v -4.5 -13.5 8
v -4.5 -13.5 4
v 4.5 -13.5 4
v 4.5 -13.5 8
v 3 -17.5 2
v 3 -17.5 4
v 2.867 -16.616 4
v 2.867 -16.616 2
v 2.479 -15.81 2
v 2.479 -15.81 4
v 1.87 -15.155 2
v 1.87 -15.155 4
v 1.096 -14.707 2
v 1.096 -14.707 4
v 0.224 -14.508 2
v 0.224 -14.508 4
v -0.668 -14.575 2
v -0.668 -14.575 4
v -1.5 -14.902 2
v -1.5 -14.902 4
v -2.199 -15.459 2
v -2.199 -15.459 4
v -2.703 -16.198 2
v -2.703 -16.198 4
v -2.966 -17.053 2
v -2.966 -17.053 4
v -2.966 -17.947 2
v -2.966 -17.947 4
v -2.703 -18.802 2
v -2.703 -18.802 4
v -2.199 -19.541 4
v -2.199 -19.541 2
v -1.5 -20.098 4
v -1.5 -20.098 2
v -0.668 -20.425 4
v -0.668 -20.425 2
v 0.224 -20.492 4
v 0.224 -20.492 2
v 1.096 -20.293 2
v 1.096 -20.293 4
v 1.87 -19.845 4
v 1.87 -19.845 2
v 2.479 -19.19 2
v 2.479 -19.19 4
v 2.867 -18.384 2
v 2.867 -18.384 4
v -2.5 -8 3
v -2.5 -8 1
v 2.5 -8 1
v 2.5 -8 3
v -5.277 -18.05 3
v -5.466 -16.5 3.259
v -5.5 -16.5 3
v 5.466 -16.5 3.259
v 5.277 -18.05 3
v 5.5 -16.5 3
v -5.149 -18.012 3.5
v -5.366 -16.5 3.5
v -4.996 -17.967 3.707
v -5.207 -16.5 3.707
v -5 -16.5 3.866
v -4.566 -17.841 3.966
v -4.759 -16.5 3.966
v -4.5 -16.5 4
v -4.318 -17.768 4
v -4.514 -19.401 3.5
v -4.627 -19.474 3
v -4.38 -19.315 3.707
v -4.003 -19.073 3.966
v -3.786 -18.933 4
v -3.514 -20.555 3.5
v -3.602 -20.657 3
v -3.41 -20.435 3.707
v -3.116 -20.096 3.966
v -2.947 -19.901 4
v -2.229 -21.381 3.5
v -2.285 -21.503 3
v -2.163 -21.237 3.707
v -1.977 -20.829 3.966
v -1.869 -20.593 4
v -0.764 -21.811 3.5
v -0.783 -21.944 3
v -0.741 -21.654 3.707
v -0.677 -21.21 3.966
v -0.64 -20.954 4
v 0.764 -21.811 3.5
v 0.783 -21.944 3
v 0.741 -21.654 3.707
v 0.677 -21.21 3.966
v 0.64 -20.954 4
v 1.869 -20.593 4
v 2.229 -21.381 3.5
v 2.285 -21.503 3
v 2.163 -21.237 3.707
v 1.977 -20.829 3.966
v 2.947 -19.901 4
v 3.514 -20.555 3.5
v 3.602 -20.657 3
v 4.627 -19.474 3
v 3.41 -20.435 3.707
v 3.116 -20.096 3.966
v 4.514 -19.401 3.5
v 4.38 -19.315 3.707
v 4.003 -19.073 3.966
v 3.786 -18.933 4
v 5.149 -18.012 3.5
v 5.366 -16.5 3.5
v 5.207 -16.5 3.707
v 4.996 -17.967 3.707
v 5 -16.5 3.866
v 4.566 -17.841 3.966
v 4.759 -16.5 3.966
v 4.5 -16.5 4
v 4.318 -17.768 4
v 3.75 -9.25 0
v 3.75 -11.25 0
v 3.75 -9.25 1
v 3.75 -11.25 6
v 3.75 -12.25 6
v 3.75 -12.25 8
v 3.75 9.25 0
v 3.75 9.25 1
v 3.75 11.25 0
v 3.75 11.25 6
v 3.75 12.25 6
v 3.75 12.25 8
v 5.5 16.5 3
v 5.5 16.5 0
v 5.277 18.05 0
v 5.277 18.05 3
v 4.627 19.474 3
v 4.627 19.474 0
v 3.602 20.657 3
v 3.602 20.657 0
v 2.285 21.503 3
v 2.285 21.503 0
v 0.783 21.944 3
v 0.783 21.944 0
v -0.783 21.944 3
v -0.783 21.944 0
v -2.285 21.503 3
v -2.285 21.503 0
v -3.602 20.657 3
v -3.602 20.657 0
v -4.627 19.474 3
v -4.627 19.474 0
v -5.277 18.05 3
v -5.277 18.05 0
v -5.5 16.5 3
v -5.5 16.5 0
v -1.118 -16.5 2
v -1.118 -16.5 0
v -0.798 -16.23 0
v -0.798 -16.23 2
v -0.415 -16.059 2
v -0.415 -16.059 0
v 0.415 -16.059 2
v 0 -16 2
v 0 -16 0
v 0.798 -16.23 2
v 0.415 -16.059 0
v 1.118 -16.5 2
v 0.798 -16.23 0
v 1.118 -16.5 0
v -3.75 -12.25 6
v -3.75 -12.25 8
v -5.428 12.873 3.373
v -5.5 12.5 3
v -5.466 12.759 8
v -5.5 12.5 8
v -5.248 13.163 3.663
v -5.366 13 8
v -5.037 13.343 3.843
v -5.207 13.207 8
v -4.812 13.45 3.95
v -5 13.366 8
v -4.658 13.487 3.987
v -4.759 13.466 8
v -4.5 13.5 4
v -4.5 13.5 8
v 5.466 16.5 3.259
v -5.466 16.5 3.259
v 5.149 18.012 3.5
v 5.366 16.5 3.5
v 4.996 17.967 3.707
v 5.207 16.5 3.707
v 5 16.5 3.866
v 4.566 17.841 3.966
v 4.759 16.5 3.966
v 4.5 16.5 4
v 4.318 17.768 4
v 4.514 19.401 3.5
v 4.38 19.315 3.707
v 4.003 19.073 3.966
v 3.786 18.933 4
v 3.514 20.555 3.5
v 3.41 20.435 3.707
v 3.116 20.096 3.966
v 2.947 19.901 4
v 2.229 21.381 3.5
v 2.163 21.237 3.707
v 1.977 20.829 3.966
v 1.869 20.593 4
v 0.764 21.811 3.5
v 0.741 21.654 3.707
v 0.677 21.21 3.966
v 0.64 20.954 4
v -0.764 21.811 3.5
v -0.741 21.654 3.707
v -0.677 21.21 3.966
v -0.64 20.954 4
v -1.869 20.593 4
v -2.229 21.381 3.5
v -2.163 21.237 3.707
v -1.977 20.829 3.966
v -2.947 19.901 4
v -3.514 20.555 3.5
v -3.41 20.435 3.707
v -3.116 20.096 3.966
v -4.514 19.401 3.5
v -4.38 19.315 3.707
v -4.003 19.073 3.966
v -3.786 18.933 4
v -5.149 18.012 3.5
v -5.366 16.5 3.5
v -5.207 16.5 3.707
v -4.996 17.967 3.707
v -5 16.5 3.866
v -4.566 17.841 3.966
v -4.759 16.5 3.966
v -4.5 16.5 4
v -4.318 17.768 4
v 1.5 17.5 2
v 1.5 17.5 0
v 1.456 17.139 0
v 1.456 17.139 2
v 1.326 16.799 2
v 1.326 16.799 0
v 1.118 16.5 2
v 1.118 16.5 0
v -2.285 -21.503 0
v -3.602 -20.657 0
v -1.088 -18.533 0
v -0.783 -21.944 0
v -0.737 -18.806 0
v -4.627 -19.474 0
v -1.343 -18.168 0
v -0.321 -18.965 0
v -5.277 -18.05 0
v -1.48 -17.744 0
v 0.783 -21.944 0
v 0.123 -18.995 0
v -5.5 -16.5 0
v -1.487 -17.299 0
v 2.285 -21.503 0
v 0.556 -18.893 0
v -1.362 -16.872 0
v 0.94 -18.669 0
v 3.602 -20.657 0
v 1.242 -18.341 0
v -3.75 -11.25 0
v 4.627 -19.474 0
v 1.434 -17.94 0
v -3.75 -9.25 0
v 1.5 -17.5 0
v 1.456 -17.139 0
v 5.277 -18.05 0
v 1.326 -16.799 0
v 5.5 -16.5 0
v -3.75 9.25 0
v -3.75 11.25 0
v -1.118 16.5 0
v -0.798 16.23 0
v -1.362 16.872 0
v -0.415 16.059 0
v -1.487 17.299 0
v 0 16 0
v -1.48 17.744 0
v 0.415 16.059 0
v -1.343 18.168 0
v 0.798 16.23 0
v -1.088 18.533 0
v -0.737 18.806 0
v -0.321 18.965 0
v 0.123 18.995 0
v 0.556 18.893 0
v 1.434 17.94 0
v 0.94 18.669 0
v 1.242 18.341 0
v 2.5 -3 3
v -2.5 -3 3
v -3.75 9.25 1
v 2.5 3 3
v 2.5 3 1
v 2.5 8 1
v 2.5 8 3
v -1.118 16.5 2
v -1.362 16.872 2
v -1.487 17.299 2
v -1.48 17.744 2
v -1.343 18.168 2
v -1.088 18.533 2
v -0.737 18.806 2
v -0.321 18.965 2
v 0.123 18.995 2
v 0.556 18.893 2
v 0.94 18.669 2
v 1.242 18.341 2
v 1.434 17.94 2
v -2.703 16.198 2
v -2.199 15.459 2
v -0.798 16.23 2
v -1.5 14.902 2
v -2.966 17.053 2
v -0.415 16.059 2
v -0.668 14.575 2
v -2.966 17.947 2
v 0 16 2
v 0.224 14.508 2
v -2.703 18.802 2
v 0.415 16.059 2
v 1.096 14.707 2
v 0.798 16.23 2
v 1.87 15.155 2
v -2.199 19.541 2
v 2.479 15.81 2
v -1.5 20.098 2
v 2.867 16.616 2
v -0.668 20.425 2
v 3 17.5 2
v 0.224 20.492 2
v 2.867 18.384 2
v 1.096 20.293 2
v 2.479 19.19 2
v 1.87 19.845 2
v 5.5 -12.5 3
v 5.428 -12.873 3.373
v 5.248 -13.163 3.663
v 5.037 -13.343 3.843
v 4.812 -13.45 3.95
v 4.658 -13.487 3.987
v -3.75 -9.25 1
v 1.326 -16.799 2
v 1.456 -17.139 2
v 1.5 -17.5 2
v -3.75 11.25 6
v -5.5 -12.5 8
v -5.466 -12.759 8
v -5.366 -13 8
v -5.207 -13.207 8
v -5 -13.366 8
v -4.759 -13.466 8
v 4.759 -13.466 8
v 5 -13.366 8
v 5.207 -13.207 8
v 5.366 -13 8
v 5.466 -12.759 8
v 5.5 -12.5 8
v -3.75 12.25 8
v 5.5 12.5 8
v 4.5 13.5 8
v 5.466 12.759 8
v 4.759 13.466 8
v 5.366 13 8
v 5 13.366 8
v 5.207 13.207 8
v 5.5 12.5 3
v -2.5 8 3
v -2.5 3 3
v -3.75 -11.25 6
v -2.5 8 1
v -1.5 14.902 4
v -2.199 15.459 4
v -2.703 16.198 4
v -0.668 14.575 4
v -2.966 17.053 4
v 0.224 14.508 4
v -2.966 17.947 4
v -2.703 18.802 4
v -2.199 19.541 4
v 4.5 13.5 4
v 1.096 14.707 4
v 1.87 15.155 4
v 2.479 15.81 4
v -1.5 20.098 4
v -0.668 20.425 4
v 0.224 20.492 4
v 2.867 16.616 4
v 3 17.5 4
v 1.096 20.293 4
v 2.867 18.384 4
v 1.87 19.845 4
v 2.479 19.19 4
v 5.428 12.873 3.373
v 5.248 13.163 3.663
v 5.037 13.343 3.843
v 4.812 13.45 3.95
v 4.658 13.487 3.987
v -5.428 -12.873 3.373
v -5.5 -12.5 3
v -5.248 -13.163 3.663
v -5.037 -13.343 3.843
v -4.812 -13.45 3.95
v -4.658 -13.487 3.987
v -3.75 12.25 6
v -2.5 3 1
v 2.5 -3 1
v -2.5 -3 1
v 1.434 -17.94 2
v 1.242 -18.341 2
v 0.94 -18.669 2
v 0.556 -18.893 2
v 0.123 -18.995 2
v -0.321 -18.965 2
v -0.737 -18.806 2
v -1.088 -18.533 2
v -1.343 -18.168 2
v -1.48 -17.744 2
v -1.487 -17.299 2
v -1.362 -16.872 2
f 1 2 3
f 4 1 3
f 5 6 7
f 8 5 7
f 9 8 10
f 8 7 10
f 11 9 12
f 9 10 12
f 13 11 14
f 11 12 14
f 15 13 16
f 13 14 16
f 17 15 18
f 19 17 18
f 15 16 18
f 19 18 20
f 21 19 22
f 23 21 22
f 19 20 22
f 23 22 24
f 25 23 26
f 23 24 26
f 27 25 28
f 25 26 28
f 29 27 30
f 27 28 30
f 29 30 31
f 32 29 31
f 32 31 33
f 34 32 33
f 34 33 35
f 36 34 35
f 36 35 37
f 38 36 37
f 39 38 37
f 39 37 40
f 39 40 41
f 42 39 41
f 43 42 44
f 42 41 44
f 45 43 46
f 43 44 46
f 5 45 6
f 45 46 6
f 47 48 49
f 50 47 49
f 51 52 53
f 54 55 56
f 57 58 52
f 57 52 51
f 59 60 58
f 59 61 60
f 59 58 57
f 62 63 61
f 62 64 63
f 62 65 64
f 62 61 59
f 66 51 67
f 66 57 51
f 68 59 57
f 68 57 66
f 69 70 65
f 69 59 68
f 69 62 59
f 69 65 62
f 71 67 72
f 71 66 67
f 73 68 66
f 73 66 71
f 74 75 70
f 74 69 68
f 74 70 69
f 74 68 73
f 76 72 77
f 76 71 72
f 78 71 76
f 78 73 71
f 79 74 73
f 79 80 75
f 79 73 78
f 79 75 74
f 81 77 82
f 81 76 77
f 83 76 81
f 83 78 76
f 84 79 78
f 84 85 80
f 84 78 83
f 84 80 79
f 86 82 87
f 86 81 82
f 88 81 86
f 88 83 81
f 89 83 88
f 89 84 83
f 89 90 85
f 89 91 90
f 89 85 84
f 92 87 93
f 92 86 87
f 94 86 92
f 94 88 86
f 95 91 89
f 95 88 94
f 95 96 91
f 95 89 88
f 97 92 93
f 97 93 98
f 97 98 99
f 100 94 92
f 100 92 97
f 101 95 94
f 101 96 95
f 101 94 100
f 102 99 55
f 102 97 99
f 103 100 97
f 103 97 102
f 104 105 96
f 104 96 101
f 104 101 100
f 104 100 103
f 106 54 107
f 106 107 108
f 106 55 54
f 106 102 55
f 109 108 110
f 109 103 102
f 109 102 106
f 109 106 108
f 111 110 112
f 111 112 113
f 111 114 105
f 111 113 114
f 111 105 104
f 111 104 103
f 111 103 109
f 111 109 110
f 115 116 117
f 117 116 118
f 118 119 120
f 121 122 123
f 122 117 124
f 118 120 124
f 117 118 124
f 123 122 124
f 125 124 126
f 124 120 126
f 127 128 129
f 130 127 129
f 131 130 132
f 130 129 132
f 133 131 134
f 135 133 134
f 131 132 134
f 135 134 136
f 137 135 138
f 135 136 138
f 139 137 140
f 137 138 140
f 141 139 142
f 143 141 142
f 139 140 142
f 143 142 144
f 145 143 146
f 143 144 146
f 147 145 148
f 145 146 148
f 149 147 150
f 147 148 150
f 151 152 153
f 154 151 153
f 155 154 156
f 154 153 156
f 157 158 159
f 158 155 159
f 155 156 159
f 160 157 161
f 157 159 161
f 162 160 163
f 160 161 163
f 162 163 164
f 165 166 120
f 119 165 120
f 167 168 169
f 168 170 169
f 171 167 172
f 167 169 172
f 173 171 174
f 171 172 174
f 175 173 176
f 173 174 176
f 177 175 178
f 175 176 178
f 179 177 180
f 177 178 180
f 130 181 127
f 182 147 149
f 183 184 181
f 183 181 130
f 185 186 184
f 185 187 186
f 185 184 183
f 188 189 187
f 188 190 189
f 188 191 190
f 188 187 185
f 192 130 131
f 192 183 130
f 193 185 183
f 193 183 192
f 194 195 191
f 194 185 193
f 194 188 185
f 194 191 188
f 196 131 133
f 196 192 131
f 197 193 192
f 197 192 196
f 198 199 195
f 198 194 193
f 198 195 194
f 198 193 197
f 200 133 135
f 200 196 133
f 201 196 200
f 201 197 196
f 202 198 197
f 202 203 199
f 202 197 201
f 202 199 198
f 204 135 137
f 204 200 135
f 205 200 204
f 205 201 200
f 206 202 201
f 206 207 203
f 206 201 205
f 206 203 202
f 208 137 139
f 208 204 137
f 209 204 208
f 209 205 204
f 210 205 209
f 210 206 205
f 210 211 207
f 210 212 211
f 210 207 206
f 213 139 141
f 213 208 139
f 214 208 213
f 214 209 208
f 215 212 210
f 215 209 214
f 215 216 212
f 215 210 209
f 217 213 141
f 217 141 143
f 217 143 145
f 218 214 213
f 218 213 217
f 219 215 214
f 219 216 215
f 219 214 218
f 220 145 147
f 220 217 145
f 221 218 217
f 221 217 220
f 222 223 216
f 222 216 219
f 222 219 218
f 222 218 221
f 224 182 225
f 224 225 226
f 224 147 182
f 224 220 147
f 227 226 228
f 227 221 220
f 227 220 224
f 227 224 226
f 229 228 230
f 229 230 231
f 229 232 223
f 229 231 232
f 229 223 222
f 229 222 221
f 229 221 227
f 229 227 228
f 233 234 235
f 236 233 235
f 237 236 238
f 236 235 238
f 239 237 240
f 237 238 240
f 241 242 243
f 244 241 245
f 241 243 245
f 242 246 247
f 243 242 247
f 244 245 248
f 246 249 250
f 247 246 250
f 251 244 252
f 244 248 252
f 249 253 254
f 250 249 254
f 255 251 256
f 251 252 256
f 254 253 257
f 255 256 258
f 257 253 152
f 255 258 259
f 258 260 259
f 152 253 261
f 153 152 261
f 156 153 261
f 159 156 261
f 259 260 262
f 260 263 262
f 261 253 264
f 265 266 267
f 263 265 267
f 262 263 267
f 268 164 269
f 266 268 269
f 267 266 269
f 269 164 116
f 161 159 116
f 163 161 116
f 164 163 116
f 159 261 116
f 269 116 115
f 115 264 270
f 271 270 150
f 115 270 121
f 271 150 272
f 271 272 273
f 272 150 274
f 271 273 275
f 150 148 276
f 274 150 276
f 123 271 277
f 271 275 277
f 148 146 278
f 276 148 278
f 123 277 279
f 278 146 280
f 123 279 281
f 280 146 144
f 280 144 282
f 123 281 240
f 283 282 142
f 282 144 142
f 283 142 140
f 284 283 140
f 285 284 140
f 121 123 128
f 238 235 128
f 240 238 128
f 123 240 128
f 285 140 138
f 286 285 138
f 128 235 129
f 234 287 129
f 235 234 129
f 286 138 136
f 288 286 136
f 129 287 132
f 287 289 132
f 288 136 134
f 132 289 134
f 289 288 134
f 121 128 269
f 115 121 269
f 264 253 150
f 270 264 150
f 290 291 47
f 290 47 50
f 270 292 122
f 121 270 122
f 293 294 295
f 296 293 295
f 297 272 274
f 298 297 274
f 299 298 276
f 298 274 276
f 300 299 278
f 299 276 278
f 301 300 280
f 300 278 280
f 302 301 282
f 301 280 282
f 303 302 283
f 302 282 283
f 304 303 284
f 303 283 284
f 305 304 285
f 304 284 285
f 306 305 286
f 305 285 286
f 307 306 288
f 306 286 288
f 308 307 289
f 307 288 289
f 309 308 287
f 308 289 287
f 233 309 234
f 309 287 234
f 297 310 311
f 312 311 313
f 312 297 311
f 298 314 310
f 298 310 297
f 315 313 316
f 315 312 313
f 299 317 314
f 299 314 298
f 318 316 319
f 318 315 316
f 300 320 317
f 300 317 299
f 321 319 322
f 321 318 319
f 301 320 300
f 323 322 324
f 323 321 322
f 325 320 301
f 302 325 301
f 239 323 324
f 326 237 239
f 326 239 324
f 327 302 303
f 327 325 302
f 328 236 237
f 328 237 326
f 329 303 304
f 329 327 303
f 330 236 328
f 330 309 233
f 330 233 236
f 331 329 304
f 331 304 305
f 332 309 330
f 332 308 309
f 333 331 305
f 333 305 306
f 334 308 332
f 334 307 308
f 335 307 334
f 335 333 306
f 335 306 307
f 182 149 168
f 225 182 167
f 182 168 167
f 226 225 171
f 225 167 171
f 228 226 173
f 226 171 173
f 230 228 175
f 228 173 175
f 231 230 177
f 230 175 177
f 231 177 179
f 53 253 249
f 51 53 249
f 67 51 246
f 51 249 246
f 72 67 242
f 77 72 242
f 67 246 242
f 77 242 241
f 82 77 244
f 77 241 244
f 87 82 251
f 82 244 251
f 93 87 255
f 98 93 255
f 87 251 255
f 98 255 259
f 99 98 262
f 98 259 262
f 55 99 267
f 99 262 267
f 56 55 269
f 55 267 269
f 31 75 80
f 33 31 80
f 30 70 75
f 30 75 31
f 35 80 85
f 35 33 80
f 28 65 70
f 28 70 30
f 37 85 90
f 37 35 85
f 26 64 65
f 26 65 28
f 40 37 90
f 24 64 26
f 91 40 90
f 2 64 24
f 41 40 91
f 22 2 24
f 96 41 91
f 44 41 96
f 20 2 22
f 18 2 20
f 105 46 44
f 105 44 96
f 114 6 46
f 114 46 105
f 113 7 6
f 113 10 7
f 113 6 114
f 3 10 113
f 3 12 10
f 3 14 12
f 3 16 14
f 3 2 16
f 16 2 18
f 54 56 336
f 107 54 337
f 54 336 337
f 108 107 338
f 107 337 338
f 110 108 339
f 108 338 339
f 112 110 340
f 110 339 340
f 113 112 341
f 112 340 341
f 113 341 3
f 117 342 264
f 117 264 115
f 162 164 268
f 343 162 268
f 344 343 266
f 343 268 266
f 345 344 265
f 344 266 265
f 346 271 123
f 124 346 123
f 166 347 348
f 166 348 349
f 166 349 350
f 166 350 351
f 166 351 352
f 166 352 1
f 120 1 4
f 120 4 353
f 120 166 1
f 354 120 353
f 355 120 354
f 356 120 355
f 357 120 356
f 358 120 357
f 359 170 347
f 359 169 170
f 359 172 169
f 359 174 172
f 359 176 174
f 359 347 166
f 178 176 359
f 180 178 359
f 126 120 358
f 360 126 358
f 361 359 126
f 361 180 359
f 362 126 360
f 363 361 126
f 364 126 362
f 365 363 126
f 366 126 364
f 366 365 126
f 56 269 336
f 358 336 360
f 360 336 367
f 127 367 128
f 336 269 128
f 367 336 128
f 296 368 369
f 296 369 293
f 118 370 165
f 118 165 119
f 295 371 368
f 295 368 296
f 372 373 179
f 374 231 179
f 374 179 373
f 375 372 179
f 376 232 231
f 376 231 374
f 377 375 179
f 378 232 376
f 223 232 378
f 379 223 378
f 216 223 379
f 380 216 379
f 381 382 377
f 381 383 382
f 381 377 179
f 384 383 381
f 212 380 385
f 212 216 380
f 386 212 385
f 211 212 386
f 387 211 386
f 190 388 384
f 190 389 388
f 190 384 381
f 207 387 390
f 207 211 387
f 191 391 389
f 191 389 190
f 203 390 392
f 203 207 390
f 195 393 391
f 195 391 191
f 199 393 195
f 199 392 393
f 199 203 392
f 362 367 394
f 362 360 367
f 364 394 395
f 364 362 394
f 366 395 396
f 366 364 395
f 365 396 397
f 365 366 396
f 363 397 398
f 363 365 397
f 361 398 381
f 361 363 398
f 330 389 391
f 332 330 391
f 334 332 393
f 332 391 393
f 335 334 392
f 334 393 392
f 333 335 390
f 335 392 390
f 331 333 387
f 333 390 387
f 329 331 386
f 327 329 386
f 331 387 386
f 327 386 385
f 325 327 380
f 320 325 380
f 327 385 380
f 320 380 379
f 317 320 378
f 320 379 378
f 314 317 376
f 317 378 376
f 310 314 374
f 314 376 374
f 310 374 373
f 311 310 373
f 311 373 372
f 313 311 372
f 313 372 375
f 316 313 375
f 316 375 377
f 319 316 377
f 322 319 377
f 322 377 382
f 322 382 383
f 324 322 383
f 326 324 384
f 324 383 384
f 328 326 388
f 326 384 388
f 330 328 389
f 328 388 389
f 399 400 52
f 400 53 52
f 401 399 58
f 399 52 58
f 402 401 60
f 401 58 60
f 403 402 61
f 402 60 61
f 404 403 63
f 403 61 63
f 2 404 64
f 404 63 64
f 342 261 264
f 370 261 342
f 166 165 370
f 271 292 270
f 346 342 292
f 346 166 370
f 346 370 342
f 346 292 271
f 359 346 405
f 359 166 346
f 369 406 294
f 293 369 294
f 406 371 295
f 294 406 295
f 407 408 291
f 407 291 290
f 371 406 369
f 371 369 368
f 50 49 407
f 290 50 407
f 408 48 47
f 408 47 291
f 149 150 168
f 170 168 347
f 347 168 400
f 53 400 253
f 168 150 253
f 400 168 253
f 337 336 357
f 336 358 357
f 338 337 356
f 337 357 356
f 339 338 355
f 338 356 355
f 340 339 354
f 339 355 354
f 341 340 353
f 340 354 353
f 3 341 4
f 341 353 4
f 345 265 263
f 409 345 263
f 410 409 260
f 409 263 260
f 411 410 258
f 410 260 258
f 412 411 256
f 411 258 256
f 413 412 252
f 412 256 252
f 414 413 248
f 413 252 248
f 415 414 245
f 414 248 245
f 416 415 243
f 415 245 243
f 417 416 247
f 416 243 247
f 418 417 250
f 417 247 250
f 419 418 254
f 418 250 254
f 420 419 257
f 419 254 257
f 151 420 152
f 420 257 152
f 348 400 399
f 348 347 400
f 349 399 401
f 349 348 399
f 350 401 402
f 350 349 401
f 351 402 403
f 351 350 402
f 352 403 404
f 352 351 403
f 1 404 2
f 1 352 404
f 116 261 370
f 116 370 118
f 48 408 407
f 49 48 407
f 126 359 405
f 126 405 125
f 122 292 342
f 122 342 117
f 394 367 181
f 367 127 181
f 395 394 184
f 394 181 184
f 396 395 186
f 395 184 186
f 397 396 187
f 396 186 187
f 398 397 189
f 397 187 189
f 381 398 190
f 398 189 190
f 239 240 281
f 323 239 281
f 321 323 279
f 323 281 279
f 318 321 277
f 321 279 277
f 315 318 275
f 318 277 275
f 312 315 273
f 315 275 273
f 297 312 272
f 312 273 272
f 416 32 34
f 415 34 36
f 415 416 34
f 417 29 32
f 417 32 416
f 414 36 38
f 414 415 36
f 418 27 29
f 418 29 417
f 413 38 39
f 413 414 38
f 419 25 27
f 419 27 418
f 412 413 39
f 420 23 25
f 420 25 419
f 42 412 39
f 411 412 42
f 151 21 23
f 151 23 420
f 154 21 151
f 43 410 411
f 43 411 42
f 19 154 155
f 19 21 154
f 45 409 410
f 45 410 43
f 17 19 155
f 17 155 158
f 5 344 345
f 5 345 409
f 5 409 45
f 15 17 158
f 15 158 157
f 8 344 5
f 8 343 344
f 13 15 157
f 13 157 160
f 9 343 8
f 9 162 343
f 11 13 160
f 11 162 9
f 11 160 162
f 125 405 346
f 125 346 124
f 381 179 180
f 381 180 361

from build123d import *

# Parameters (mm, degrees)
F1_DEPTH  = 4
F2_W      = 11
F2_H      = 27
F3_DEPTH  = 4
F4_W      = 7.5
F4_H      = 24.5
F5_DEPTH  = 7
F6_W      = 7.5
F6_H      = 1
F7_DEPTH  = 5
F8_W      = 7.5
F8_H      = 2
F9_DEPTH  = 25
F10_W     = 5
F10_H     = 5
F11_DEPTH = 2
F12_R     = 3
F12_R_2   = 1.5
F13_DEPTH = 2
F14_R     = 1


# Not quite as in the source:
# - a feature names something its author has since deleted; it is built from what else it names


with BuildPart() as f1:
    # F0 (on Top) → F1 (new body)
    with BuildSketch(Plane.XY):
        with BuildLine():
            ThreePointArc((-5.5, -16.5), (0, -22), (5.5, -16.5))
            Line((5.5, -16.5), (1.1180339887, -16.5))
            ThreePointArc((1.1180339887, -16.5), (1.4012585384, -16.9647668653), (1.5, -17.5))
            ThreePointArc((1.5, -17.5), (-0.5352331347, -18.9012585384), (-1.1180339887, -16.5))
            Line((-1.1180339887, -16.5), (-5.5, -16.5))
        make_face()
        with BuildLine():
            Line((1.1180339887, -16.5), (5.5, -16.5))
            Line((5.5, -16.5), (5.5, 16.5))
            Line((5.5, 16.5), (1.1180339887, 16.5))
            ThreePointArc((1.1180339887, 16.5), (0, 16), (-1.1180339887, 16.5))
            Line((-1.1180339887, 16.5), (-5.5, 16.5))
            Line((-5.5, 16.5), (-5.5, -16.5))
            Line((-5.5, -16.5), (-1.1180339887, -16.5))
            ThreePointArc((-1.1180339887, -16.5), (0, -16), (1.1180339887, -16.5))
        make_face()
        with BuildLine():
            Line((1.1180339887, 16.5), (5.5, 16.5))
            ThreePointArc((5.5, 16.5), (0, 22), (-5.5, 16.5))
            Line((-5.5, 16.5), (-1.1180339887, 16.5))
            ThreePointArc((-1.1180339887, 16.5), (-0.5352331347, 18.9012585384), (1.5, 17.5))
            ThreePointArc((1.5, 17.5), (1.4012585384, 16.9647668653), (1.1180339887, 16.5))
        make_face()
    extrude(amount=F1_DEPTH)

    # F2 (on face) → F3 (join)
    with BuildSketch(Plane.XY.offset(4)):
        Rectangle(F2_W, F2_H)
    extrude(amount=F3_DEPTH)

    # F4 (on face) → F5 (cut)
    with BuildSketch(Plane.XY.offset(8)):
        Rectangle(F4_W, F4_H)
    extrude(amount=-F5_DEPTH, mode=Mode.SUBTRACT)

    # F6 (on face) → F7 (join)
    with BuildSketch(Plane.XY.offset(1)):
        with Locations((0, 11.75)):
            Rectangle(F6_W, F6_H)
        with Locations((0, -11.75)):
            Rectangle(F6_W, F6_H)
    extrude(amount=F7_DEPTH)

    # F8 (on face) → F9 (cut)
    with BuildSketch(Plane.XY.offset(1)):
        with Locations((0, 10.25)):
            Rectangle(F8_W, F8_H)
        with Locations((0, -10.25)):
            Rectangle(F8_W, F8_H)
    extrude(amount=-F9_DEPTH, mode=Mode.SUBTRACT)

    # F12 (on face) → F13 (cut)
    with BuildSketch(Plane.XY.offset(4)):
        with Locations((0, 17.5)):
            Circle(F12_R)
        with Locations((0, -17.5)):
            Circle(F12_R)
        with Locations((0, -17.5)):
            Circle(F12_R_2, mode=Mode.SUBTRACT)
    extrude(amount=-F13_DEPTH, mode=Mode.SUBTRACT)

    # F14
    f14_edges = [f1.edges().sort_by_distance(p)[0] for p in [
        (0, -22, 4),
        (-5.5, -13.5, 6),
        (5.5, -13.5, 6),
        (5.5, 13.5, 6),
        (-5.5, 13.5, 6),
        (0, 22, 4),
    ]]
    fillet(f14_edges, radius=F14_R)


with BuildPart() as f11:
    # F10 (on face) → F11 (new body)
    with BuildSketch(Plane.XY.offset(1)):
        with Locations((0, 5.5)):
            Rectangle(F10_W, F10_H)
    extrude(amount=F11_DEPTH)


with BuildPart() as f11b:
    # F10 (on face) → F11, piece 2 (new body)
    with BuildSketch(Plane.XY.offset(1)):
        with Locations((0, -5.5)):
            Rectangle(F10_W, F10_H)
    extrude(amount=F11_DEPTH)


solid = Compound([f1.part, f11.part, f11b.part])
